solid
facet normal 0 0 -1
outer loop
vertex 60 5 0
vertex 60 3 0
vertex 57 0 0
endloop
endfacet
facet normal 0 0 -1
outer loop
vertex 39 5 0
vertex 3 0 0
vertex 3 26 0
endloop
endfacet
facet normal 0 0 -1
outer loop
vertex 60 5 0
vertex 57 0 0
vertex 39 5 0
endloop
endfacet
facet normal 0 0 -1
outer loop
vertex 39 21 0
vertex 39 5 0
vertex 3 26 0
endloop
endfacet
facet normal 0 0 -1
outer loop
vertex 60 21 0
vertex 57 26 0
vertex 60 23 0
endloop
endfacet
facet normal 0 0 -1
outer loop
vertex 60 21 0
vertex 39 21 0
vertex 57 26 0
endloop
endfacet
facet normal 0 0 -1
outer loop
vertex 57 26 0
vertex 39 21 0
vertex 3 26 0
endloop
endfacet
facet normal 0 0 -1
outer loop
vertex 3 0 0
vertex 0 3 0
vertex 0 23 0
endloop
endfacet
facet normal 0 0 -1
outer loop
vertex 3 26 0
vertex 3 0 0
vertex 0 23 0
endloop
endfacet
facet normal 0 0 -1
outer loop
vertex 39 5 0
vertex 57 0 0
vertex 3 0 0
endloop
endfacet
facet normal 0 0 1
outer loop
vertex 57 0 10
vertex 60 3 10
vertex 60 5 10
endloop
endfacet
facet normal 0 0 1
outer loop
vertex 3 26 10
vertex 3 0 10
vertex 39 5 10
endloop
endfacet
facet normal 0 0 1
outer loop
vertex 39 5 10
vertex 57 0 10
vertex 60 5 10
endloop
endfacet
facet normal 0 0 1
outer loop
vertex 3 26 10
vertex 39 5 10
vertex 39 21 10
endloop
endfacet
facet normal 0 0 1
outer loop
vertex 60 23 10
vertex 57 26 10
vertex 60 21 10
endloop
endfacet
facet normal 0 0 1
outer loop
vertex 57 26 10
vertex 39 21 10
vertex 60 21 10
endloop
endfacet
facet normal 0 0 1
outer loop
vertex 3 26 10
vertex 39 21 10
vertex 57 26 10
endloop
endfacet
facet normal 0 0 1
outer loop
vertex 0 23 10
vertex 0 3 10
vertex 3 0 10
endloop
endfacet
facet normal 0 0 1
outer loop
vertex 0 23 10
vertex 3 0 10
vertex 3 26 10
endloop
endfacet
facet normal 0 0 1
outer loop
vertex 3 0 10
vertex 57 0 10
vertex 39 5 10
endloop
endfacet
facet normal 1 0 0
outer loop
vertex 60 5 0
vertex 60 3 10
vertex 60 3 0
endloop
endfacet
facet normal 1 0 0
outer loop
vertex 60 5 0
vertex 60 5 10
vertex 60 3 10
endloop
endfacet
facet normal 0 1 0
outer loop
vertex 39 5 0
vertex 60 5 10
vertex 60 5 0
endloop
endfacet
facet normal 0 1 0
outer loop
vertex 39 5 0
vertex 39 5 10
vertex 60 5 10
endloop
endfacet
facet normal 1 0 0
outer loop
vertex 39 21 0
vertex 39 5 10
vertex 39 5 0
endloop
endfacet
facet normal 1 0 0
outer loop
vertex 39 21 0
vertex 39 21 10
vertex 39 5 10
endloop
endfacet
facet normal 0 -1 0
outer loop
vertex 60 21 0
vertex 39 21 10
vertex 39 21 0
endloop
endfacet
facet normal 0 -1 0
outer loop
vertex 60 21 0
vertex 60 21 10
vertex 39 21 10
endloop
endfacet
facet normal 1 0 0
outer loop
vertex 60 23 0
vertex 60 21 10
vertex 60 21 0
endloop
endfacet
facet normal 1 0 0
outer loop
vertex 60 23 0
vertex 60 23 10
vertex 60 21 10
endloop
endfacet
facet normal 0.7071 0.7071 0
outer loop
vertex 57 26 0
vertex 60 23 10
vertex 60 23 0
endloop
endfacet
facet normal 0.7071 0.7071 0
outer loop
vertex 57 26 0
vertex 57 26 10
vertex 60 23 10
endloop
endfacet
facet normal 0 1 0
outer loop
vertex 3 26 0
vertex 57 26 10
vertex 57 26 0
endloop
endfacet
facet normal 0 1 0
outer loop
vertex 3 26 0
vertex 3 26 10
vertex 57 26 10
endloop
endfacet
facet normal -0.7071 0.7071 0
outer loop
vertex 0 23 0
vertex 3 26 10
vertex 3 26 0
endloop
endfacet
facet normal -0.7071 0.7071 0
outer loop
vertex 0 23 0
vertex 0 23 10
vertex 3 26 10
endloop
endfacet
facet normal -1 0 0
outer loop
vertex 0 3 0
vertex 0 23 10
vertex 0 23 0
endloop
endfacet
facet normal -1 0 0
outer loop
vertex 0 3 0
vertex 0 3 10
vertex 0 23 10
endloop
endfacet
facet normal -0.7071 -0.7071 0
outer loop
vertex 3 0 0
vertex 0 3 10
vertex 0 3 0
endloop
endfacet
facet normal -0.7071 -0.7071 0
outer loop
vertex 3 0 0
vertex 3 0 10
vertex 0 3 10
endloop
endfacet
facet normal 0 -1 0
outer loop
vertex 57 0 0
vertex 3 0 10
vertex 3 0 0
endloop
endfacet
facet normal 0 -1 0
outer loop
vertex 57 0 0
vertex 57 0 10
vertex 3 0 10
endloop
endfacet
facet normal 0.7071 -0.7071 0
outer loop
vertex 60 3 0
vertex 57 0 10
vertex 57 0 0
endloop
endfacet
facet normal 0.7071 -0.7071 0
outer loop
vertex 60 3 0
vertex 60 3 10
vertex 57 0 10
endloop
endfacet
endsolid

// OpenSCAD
$fn = 32;

// ----------------------------------------------------------------------
// C washer: 60 x 26 mm plate with an open slot
// ----------------------------------------------------------------------

// --- parameters (mm) ---
profile_height = 10;      // extrusion height
profile_points = 12;      // points of the closed outline

profile = [[3, 0], [57, 0], [60, 3], [60, 5], [39, 5], [39, 21], [60, 21], [60, 23], [57, 26], [3, 26], [0, 23], [0, 3]];  // single closed polygon, 12 points, counter clockwise

// --- the one profile operation ---
linear_extrude(height = profile_height) polygon(points = profile);
